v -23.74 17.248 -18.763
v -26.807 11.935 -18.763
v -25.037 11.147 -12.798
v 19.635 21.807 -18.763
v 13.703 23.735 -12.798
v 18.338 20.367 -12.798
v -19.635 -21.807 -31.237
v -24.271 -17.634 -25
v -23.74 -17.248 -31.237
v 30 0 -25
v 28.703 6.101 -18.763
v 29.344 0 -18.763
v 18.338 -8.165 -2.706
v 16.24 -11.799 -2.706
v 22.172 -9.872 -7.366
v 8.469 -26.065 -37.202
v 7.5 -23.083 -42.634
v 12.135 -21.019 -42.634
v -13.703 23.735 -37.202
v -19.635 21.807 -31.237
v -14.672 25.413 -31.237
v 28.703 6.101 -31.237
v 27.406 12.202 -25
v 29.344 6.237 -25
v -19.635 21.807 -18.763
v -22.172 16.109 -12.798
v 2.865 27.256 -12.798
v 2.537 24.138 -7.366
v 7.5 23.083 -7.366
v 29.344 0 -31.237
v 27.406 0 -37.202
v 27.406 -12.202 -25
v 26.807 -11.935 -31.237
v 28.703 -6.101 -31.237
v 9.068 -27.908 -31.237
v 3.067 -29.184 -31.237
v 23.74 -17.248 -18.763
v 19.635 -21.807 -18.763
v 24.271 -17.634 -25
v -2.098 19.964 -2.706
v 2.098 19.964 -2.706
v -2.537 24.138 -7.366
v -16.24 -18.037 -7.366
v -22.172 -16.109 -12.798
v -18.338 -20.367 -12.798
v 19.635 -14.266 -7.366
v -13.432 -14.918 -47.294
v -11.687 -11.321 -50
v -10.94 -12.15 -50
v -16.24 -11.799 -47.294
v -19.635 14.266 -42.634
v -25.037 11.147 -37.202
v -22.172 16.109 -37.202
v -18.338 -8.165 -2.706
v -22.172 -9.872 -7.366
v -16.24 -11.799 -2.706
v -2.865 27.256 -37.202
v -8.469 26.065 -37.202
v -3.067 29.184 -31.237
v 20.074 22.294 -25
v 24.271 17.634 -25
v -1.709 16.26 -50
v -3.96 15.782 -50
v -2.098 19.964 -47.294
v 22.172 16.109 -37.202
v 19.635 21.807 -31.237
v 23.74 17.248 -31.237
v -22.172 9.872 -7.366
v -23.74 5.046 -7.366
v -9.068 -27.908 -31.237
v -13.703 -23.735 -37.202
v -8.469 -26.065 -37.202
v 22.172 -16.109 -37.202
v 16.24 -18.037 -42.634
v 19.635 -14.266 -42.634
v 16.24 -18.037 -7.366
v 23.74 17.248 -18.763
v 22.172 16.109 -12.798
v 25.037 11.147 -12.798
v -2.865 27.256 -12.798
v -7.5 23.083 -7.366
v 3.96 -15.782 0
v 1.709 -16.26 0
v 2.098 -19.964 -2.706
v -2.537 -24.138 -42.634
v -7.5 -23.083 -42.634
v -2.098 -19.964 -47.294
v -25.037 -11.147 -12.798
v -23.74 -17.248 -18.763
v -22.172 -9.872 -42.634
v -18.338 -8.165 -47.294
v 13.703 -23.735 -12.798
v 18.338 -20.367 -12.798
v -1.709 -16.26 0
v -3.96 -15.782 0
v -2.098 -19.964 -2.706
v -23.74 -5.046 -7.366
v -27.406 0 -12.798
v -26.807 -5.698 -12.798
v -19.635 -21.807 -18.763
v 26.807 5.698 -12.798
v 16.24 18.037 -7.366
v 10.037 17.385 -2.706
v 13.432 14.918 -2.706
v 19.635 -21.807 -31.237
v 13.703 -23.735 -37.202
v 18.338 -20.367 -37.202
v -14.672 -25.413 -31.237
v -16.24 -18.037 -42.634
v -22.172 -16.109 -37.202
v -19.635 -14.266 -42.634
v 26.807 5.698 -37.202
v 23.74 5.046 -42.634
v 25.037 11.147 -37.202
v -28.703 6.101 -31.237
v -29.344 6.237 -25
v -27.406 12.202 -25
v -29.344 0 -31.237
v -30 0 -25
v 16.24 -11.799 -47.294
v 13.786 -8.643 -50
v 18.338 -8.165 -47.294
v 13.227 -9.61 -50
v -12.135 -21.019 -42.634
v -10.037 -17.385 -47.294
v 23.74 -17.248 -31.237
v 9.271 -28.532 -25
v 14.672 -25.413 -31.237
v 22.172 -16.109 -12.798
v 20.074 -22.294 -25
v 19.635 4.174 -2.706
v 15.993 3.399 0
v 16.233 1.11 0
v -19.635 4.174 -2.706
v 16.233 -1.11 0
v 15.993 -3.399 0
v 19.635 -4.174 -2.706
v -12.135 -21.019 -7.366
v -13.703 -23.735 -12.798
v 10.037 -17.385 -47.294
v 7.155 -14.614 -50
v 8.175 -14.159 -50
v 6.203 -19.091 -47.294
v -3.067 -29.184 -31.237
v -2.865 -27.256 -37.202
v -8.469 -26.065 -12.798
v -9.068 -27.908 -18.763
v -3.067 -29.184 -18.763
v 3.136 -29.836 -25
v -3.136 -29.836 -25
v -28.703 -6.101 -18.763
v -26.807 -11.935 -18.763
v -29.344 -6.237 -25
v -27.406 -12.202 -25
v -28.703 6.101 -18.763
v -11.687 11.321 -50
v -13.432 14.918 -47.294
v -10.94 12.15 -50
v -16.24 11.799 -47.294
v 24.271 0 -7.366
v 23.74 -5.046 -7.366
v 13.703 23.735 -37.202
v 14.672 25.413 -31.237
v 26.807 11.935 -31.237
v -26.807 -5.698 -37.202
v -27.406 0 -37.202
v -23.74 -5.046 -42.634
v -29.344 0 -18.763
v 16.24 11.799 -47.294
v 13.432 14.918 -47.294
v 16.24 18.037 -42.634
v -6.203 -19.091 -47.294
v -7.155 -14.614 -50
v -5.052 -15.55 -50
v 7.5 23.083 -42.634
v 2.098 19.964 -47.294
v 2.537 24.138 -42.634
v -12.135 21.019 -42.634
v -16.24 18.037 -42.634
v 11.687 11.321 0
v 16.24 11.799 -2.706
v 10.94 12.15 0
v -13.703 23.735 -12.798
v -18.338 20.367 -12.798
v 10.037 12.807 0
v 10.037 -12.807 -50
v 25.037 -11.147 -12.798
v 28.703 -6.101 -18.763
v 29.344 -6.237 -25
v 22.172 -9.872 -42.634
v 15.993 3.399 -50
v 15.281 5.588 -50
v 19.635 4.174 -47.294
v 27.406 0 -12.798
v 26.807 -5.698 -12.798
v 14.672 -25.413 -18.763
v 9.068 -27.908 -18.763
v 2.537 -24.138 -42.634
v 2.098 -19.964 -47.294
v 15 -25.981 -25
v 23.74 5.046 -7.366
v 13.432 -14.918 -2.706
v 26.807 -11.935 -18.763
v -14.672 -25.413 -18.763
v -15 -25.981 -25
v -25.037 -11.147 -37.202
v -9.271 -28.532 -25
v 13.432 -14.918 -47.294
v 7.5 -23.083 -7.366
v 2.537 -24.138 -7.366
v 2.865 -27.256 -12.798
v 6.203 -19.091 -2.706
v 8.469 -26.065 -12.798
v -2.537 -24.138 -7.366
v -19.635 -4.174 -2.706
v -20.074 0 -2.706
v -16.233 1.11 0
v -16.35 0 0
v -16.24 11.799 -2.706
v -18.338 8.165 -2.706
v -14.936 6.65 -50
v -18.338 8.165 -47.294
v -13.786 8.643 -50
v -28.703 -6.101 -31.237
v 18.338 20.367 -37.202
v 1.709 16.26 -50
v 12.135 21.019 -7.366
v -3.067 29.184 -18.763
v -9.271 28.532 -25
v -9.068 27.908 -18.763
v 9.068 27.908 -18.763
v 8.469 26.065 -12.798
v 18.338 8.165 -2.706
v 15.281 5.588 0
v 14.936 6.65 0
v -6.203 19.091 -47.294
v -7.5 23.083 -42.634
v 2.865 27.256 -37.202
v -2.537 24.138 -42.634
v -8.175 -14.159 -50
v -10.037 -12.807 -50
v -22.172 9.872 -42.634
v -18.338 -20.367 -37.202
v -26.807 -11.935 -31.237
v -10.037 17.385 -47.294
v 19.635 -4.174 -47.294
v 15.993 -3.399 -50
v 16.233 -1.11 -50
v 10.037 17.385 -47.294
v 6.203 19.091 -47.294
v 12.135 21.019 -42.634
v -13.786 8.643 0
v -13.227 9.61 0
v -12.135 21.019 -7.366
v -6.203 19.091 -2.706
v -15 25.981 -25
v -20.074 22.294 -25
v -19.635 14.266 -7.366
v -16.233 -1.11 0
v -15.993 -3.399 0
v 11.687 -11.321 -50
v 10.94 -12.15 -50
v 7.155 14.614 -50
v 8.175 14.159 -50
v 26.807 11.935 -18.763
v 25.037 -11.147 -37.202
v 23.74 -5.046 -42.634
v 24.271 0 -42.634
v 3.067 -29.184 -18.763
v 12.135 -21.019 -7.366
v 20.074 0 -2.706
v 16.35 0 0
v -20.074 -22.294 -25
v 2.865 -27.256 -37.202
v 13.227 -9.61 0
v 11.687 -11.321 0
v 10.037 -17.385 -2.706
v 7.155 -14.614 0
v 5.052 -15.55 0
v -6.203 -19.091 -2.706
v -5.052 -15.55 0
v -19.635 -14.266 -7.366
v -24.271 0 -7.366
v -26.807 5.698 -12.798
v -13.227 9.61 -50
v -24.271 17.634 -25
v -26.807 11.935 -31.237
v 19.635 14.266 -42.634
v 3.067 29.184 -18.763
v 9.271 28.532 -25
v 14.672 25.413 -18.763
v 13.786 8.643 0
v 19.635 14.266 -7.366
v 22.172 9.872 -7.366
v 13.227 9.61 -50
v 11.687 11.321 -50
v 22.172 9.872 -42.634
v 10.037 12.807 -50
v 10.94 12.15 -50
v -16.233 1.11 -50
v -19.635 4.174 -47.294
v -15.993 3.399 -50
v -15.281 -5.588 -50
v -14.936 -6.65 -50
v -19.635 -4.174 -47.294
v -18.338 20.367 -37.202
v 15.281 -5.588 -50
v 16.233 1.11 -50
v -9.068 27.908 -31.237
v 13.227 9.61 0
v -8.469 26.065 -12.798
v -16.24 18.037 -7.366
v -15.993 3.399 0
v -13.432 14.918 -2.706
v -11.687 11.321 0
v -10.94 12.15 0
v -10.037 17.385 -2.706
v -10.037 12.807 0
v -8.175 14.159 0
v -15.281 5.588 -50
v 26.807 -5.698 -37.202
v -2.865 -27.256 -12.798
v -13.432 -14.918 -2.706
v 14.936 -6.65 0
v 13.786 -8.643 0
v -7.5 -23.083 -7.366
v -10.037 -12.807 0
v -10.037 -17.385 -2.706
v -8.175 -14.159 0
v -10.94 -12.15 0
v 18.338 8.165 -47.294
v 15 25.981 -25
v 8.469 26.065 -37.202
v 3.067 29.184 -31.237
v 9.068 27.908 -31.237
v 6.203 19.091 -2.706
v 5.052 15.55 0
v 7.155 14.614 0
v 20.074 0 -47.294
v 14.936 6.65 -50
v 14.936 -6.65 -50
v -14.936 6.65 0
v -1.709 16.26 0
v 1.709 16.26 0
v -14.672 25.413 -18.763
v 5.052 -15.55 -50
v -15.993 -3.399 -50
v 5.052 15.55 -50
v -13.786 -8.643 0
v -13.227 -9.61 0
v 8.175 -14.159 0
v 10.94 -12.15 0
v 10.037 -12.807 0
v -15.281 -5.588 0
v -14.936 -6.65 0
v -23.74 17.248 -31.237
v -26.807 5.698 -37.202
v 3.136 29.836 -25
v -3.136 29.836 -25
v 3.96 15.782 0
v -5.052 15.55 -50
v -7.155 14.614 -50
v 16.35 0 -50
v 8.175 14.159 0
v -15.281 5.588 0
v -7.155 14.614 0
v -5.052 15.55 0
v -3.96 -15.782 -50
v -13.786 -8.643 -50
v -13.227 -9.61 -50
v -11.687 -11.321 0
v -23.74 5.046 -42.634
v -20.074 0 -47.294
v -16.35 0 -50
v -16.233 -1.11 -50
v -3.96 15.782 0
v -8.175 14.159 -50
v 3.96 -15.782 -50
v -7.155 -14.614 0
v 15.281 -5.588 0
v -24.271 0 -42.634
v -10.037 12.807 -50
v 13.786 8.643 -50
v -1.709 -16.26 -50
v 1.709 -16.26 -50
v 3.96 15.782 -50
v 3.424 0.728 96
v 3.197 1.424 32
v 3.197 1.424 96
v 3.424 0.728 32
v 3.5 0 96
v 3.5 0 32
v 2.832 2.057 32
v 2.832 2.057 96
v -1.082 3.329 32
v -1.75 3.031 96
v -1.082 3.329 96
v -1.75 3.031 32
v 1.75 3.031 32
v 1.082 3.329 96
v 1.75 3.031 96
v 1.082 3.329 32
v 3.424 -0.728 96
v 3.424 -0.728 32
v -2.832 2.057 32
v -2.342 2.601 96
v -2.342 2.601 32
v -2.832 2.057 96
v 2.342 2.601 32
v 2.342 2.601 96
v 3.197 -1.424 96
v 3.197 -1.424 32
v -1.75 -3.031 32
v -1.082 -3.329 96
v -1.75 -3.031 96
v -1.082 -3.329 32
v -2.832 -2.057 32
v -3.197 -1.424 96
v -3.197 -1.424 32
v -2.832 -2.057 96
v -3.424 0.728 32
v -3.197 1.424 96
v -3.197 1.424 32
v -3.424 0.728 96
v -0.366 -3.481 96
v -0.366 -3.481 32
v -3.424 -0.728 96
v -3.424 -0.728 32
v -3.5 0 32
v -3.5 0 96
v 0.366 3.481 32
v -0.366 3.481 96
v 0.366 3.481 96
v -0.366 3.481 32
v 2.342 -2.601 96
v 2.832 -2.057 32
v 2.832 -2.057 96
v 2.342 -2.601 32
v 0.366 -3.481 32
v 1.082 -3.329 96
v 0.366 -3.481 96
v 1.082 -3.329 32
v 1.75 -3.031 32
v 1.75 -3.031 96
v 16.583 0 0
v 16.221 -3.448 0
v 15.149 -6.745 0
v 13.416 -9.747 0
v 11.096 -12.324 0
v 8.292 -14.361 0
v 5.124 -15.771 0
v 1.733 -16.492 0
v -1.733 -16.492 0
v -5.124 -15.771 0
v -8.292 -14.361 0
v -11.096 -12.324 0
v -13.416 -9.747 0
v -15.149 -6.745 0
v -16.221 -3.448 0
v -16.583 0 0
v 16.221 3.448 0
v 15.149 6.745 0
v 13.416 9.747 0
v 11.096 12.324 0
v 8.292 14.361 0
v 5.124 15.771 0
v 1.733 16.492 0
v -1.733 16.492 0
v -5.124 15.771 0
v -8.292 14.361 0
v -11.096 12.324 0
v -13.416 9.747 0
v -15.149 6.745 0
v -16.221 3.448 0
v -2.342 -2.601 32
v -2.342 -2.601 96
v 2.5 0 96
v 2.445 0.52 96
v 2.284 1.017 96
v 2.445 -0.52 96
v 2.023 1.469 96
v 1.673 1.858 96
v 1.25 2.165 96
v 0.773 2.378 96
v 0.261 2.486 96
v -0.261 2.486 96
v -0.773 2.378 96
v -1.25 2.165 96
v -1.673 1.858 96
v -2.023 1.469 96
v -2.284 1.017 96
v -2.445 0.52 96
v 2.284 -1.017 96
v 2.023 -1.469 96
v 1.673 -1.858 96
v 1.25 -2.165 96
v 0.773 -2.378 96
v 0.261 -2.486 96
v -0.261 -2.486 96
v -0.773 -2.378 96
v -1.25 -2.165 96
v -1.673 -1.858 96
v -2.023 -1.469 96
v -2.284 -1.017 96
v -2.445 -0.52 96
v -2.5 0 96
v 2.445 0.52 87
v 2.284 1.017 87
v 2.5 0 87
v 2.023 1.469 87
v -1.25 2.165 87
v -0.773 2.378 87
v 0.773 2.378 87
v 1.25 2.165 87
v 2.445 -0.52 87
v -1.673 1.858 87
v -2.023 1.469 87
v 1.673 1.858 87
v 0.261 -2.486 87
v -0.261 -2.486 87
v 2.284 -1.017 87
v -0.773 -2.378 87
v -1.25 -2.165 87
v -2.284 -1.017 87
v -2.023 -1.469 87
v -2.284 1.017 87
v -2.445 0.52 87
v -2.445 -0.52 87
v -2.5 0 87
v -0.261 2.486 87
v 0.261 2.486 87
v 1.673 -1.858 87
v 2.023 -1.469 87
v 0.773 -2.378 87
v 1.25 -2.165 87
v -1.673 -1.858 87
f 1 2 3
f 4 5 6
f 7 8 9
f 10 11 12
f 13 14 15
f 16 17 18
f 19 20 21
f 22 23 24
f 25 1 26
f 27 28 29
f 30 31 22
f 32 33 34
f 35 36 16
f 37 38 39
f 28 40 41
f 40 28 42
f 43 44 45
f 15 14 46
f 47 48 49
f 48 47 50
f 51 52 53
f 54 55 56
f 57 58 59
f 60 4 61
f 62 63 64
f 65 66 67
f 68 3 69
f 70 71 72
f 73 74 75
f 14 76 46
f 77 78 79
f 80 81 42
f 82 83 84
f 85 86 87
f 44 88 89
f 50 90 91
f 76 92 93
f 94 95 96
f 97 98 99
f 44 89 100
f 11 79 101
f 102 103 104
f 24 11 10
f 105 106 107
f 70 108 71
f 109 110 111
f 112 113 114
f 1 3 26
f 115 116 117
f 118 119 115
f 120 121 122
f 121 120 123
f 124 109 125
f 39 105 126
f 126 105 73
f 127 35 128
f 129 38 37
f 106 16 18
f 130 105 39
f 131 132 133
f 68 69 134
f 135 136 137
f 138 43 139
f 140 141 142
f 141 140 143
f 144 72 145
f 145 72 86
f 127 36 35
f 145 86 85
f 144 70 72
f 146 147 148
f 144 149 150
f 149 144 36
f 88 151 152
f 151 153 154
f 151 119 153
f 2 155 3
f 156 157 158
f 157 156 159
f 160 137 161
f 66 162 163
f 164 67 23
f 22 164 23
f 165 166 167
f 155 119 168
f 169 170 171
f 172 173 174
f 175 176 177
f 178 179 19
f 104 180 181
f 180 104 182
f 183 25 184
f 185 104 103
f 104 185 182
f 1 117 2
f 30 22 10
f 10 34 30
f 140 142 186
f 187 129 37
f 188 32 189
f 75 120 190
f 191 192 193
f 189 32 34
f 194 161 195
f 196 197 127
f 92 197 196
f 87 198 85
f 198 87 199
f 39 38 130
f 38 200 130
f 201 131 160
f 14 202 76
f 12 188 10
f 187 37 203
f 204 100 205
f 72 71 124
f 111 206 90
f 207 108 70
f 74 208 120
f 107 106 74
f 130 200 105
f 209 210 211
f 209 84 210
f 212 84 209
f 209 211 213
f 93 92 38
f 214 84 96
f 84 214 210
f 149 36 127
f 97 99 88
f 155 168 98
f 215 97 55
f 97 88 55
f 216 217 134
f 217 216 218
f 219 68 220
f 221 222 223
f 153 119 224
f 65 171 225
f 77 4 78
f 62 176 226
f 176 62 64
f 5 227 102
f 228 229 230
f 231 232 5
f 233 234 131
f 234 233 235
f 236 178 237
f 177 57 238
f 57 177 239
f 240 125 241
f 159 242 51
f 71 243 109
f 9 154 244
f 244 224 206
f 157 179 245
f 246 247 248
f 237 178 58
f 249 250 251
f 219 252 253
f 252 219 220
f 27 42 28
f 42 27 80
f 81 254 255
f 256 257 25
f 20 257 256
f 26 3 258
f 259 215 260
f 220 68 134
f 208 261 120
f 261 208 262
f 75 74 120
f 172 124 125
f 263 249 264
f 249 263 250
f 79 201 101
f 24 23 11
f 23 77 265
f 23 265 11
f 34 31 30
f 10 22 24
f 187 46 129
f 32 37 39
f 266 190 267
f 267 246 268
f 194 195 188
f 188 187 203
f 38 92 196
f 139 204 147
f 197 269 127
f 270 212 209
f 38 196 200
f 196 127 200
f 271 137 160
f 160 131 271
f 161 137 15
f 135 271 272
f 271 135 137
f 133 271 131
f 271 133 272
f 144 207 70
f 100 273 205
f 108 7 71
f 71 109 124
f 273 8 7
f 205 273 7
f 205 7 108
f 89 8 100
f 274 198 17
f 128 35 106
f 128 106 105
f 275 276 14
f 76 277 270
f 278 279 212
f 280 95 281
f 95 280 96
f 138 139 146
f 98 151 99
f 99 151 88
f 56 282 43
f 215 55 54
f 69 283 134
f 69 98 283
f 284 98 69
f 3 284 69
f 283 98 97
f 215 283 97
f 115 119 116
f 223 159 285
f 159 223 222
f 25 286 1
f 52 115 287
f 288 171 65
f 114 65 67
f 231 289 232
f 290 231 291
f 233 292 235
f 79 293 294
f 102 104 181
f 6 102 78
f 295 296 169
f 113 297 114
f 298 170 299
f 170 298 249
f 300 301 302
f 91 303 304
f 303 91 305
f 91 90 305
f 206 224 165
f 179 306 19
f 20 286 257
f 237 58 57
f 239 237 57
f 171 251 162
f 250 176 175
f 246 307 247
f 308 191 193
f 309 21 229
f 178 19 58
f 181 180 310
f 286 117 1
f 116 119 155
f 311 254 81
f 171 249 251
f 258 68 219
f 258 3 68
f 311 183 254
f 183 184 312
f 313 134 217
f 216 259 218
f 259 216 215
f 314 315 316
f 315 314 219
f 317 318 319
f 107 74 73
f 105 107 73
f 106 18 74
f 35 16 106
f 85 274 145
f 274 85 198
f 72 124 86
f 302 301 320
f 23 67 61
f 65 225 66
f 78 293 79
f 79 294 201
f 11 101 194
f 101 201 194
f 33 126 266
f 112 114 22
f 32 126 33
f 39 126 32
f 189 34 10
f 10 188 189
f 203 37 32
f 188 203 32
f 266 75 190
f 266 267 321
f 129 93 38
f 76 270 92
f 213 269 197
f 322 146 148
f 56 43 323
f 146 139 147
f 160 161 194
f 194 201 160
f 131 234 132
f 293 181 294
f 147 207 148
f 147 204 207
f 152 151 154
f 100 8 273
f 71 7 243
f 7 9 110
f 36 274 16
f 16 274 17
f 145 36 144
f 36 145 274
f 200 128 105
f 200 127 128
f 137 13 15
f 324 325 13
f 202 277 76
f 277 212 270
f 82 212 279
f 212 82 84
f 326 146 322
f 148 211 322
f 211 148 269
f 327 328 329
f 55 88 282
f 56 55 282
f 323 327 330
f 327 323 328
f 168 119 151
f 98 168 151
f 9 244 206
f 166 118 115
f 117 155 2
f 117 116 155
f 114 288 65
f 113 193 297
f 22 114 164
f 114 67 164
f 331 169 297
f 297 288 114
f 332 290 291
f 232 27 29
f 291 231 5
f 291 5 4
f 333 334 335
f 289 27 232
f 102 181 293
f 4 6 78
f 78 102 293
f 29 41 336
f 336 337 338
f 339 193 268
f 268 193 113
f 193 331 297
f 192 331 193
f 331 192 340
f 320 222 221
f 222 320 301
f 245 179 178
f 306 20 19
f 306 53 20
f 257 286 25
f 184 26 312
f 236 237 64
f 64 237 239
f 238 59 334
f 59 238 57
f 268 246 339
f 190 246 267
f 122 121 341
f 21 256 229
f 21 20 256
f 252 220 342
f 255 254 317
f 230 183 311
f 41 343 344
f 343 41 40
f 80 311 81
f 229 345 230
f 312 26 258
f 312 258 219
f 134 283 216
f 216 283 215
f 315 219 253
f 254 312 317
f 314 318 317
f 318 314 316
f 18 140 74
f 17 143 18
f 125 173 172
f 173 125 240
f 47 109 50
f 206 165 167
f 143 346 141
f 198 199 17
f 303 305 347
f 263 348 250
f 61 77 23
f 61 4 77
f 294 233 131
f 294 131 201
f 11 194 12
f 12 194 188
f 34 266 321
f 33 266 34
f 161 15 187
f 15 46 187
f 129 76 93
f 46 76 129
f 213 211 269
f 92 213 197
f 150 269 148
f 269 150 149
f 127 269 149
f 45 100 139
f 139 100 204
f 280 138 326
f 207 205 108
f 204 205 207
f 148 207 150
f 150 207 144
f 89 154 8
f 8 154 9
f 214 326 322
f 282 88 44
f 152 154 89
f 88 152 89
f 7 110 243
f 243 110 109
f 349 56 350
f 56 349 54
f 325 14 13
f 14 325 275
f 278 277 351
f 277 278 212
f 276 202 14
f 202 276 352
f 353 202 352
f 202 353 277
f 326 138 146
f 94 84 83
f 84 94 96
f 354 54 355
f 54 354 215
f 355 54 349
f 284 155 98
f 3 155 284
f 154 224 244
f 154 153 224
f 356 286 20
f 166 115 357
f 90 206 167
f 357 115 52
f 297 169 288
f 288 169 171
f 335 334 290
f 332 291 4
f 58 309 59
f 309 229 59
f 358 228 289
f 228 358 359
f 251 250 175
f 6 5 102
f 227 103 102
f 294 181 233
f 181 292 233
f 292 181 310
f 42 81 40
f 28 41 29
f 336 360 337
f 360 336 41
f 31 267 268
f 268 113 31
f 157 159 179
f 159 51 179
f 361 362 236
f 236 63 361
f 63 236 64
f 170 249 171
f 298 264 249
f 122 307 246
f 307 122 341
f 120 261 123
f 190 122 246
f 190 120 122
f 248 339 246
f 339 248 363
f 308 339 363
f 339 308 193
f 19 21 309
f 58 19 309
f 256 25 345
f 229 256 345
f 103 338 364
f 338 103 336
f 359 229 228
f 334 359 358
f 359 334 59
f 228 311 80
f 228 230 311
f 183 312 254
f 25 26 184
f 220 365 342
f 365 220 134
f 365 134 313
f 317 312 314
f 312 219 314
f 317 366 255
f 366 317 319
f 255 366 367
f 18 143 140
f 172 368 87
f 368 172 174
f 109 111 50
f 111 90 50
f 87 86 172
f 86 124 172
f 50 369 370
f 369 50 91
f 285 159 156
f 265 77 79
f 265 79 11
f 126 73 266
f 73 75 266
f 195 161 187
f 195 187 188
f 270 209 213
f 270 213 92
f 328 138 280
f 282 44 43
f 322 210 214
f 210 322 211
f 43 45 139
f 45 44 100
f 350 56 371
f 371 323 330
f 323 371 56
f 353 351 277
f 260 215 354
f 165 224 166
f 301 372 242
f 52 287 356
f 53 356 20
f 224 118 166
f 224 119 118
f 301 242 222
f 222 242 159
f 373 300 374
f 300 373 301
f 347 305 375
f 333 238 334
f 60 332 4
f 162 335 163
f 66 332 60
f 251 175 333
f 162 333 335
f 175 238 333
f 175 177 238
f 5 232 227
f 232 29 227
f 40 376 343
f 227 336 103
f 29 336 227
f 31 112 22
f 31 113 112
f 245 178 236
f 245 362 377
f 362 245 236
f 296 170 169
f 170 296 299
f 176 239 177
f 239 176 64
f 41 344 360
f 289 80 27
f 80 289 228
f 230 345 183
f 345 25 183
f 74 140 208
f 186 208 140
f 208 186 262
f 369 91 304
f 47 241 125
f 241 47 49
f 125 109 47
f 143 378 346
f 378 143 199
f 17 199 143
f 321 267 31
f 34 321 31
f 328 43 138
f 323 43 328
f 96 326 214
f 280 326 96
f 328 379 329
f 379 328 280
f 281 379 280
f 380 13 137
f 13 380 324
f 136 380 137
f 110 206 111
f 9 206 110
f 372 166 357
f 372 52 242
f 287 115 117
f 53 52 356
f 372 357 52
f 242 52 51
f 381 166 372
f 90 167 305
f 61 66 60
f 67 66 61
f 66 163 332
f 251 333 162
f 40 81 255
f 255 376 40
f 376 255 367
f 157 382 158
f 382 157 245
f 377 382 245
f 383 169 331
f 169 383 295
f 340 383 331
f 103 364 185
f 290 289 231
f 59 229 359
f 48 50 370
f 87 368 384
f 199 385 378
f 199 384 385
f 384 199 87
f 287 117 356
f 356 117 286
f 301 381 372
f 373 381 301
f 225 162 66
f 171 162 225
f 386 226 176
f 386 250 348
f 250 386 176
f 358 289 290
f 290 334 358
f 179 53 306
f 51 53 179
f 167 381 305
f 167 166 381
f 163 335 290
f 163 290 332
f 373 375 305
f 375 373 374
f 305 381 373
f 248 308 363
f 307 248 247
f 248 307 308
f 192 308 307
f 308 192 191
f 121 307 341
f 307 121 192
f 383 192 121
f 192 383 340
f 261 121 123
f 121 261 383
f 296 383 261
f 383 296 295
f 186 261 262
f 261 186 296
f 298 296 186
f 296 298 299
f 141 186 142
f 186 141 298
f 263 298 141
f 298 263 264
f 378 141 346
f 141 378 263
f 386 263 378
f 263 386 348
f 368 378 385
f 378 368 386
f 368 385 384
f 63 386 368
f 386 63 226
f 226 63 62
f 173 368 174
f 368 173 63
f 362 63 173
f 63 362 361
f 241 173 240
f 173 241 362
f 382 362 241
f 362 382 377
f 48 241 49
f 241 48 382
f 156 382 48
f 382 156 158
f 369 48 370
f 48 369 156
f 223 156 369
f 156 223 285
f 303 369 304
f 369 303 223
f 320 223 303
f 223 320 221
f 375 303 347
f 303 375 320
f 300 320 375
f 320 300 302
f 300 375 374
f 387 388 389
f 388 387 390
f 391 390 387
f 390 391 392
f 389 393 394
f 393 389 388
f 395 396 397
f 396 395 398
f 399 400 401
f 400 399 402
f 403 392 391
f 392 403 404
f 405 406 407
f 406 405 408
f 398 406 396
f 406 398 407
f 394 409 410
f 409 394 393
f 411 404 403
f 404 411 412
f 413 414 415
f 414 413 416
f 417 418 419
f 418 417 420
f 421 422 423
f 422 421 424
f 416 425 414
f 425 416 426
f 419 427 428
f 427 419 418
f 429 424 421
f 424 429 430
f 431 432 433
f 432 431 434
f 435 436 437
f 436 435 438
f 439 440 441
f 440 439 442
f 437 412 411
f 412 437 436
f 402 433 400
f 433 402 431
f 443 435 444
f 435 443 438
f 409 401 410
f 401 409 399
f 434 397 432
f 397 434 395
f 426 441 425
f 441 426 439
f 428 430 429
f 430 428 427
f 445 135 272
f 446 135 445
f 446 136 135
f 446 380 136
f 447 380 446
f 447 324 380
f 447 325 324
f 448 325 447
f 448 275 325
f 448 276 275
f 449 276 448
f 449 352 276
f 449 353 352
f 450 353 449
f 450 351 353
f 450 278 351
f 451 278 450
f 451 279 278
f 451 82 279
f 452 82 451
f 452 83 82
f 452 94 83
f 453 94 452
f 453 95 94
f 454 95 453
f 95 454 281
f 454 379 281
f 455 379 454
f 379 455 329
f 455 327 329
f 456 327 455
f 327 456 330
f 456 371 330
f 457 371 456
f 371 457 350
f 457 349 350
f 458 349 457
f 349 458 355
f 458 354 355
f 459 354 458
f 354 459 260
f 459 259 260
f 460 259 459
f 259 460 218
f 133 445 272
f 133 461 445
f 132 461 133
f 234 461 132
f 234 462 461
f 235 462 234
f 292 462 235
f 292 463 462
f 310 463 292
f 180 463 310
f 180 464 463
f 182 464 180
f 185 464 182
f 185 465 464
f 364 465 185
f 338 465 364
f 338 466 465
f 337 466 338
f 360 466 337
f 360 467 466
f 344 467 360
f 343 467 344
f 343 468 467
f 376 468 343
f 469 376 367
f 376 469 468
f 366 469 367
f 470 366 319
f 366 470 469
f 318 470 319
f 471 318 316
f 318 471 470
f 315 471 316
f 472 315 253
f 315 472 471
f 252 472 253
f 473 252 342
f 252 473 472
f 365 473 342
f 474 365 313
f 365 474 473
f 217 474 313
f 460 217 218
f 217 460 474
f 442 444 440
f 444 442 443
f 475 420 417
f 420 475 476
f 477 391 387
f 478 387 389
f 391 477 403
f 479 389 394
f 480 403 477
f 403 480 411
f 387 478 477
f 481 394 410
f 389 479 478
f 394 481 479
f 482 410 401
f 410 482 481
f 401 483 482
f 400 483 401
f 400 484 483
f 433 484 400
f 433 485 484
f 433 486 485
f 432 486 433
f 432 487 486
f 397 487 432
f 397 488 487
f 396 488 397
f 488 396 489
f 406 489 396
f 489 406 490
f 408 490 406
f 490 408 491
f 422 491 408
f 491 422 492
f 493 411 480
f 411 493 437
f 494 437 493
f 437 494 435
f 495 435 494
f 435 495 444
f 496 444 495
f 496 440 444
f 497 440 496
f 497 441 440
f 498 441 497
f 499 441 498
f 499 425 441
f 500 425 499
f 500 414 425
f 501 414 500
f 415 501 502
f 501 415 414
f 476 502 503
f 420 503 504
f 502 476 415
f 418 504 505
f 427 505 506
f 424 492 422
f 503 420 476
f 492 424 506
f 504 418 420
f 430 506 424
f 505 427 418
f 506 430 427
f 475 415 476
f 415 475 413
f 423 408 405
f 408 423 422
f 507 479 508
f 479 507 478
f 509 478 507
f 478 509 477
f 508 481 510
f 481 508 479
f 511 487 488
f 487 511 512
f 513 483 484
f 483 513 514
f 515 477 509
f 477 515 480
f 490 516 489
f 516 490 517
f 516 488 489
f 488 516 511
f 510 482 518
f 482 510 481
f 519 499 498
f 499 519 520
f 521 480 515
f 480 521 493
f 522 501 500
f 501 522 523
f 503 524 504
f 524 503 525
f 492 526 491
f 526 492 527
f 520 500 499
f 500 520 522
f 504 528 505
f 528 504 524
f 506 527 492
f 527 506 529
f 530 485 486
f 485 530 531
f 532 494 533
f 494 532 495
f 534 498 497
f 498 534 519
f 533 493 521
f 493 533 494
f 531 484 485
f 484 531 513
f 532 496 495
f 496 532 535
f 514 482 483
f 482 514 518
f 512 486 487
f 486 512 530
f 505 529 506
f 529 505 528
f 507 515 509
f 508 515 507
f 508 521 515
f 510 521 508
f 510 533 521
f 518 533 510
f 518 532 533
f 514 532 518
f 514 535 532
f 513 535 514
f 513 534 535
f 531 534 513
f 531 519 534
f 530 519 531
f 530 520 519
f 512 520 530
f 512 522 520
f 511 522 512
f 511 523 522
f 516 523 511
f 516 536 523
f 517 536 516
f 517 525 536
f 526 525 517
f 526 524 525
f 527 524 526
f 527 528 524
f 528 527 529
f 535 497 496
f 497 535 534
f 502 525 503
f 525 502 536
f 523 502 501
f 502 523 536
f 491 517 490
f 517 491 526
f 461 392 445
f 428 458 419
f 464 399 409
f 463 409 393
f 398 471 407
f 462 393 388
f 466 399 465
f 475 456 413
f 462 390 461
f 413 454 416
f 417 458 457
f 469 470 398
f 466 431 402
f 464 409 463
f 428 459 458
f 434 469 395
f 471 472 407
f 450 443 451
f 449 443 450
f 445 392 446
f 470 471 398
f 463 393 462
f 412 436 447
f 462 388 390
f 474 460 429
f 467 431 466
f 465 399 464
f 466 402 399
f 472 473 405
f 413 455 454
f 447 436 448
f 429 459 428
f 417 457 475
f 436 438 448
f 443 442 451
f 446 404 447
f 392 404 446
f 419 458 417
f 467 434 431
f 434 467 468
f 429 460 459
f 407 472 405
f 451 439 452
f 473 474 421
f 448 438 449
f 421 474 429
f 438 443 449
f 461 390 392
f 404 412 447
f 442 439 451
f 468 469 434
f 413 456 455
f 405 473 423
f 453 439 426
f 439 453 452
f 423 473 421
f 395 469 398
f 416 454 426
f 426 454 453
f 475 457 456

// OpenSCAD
// Ball Diameter
ball_d = 60;  // [20:90]
// Stylus Length
stylus = 96;  // [20:230]
// Surface Smoothing
smooth = 30;  // [30:100]

$fn = smooth;
ball = ball_d/2;
union()
{
cylinder (h=stylus/3, r1=ball*sin(acos((ball-5)/ball)), r2=3.5);
difference()
{
translate([0,0,-ball+5])
sphere(ball);
translate([-ball, -ball, -ball*4+10])
cube(ball*2);
}
difference()
{
cylinder (h=stylus, r1=3.5, r2=3.5);
translate([0,0,stylus-9])
cylinder (h=9, r1=2.5, r2=2.5);
}
}
